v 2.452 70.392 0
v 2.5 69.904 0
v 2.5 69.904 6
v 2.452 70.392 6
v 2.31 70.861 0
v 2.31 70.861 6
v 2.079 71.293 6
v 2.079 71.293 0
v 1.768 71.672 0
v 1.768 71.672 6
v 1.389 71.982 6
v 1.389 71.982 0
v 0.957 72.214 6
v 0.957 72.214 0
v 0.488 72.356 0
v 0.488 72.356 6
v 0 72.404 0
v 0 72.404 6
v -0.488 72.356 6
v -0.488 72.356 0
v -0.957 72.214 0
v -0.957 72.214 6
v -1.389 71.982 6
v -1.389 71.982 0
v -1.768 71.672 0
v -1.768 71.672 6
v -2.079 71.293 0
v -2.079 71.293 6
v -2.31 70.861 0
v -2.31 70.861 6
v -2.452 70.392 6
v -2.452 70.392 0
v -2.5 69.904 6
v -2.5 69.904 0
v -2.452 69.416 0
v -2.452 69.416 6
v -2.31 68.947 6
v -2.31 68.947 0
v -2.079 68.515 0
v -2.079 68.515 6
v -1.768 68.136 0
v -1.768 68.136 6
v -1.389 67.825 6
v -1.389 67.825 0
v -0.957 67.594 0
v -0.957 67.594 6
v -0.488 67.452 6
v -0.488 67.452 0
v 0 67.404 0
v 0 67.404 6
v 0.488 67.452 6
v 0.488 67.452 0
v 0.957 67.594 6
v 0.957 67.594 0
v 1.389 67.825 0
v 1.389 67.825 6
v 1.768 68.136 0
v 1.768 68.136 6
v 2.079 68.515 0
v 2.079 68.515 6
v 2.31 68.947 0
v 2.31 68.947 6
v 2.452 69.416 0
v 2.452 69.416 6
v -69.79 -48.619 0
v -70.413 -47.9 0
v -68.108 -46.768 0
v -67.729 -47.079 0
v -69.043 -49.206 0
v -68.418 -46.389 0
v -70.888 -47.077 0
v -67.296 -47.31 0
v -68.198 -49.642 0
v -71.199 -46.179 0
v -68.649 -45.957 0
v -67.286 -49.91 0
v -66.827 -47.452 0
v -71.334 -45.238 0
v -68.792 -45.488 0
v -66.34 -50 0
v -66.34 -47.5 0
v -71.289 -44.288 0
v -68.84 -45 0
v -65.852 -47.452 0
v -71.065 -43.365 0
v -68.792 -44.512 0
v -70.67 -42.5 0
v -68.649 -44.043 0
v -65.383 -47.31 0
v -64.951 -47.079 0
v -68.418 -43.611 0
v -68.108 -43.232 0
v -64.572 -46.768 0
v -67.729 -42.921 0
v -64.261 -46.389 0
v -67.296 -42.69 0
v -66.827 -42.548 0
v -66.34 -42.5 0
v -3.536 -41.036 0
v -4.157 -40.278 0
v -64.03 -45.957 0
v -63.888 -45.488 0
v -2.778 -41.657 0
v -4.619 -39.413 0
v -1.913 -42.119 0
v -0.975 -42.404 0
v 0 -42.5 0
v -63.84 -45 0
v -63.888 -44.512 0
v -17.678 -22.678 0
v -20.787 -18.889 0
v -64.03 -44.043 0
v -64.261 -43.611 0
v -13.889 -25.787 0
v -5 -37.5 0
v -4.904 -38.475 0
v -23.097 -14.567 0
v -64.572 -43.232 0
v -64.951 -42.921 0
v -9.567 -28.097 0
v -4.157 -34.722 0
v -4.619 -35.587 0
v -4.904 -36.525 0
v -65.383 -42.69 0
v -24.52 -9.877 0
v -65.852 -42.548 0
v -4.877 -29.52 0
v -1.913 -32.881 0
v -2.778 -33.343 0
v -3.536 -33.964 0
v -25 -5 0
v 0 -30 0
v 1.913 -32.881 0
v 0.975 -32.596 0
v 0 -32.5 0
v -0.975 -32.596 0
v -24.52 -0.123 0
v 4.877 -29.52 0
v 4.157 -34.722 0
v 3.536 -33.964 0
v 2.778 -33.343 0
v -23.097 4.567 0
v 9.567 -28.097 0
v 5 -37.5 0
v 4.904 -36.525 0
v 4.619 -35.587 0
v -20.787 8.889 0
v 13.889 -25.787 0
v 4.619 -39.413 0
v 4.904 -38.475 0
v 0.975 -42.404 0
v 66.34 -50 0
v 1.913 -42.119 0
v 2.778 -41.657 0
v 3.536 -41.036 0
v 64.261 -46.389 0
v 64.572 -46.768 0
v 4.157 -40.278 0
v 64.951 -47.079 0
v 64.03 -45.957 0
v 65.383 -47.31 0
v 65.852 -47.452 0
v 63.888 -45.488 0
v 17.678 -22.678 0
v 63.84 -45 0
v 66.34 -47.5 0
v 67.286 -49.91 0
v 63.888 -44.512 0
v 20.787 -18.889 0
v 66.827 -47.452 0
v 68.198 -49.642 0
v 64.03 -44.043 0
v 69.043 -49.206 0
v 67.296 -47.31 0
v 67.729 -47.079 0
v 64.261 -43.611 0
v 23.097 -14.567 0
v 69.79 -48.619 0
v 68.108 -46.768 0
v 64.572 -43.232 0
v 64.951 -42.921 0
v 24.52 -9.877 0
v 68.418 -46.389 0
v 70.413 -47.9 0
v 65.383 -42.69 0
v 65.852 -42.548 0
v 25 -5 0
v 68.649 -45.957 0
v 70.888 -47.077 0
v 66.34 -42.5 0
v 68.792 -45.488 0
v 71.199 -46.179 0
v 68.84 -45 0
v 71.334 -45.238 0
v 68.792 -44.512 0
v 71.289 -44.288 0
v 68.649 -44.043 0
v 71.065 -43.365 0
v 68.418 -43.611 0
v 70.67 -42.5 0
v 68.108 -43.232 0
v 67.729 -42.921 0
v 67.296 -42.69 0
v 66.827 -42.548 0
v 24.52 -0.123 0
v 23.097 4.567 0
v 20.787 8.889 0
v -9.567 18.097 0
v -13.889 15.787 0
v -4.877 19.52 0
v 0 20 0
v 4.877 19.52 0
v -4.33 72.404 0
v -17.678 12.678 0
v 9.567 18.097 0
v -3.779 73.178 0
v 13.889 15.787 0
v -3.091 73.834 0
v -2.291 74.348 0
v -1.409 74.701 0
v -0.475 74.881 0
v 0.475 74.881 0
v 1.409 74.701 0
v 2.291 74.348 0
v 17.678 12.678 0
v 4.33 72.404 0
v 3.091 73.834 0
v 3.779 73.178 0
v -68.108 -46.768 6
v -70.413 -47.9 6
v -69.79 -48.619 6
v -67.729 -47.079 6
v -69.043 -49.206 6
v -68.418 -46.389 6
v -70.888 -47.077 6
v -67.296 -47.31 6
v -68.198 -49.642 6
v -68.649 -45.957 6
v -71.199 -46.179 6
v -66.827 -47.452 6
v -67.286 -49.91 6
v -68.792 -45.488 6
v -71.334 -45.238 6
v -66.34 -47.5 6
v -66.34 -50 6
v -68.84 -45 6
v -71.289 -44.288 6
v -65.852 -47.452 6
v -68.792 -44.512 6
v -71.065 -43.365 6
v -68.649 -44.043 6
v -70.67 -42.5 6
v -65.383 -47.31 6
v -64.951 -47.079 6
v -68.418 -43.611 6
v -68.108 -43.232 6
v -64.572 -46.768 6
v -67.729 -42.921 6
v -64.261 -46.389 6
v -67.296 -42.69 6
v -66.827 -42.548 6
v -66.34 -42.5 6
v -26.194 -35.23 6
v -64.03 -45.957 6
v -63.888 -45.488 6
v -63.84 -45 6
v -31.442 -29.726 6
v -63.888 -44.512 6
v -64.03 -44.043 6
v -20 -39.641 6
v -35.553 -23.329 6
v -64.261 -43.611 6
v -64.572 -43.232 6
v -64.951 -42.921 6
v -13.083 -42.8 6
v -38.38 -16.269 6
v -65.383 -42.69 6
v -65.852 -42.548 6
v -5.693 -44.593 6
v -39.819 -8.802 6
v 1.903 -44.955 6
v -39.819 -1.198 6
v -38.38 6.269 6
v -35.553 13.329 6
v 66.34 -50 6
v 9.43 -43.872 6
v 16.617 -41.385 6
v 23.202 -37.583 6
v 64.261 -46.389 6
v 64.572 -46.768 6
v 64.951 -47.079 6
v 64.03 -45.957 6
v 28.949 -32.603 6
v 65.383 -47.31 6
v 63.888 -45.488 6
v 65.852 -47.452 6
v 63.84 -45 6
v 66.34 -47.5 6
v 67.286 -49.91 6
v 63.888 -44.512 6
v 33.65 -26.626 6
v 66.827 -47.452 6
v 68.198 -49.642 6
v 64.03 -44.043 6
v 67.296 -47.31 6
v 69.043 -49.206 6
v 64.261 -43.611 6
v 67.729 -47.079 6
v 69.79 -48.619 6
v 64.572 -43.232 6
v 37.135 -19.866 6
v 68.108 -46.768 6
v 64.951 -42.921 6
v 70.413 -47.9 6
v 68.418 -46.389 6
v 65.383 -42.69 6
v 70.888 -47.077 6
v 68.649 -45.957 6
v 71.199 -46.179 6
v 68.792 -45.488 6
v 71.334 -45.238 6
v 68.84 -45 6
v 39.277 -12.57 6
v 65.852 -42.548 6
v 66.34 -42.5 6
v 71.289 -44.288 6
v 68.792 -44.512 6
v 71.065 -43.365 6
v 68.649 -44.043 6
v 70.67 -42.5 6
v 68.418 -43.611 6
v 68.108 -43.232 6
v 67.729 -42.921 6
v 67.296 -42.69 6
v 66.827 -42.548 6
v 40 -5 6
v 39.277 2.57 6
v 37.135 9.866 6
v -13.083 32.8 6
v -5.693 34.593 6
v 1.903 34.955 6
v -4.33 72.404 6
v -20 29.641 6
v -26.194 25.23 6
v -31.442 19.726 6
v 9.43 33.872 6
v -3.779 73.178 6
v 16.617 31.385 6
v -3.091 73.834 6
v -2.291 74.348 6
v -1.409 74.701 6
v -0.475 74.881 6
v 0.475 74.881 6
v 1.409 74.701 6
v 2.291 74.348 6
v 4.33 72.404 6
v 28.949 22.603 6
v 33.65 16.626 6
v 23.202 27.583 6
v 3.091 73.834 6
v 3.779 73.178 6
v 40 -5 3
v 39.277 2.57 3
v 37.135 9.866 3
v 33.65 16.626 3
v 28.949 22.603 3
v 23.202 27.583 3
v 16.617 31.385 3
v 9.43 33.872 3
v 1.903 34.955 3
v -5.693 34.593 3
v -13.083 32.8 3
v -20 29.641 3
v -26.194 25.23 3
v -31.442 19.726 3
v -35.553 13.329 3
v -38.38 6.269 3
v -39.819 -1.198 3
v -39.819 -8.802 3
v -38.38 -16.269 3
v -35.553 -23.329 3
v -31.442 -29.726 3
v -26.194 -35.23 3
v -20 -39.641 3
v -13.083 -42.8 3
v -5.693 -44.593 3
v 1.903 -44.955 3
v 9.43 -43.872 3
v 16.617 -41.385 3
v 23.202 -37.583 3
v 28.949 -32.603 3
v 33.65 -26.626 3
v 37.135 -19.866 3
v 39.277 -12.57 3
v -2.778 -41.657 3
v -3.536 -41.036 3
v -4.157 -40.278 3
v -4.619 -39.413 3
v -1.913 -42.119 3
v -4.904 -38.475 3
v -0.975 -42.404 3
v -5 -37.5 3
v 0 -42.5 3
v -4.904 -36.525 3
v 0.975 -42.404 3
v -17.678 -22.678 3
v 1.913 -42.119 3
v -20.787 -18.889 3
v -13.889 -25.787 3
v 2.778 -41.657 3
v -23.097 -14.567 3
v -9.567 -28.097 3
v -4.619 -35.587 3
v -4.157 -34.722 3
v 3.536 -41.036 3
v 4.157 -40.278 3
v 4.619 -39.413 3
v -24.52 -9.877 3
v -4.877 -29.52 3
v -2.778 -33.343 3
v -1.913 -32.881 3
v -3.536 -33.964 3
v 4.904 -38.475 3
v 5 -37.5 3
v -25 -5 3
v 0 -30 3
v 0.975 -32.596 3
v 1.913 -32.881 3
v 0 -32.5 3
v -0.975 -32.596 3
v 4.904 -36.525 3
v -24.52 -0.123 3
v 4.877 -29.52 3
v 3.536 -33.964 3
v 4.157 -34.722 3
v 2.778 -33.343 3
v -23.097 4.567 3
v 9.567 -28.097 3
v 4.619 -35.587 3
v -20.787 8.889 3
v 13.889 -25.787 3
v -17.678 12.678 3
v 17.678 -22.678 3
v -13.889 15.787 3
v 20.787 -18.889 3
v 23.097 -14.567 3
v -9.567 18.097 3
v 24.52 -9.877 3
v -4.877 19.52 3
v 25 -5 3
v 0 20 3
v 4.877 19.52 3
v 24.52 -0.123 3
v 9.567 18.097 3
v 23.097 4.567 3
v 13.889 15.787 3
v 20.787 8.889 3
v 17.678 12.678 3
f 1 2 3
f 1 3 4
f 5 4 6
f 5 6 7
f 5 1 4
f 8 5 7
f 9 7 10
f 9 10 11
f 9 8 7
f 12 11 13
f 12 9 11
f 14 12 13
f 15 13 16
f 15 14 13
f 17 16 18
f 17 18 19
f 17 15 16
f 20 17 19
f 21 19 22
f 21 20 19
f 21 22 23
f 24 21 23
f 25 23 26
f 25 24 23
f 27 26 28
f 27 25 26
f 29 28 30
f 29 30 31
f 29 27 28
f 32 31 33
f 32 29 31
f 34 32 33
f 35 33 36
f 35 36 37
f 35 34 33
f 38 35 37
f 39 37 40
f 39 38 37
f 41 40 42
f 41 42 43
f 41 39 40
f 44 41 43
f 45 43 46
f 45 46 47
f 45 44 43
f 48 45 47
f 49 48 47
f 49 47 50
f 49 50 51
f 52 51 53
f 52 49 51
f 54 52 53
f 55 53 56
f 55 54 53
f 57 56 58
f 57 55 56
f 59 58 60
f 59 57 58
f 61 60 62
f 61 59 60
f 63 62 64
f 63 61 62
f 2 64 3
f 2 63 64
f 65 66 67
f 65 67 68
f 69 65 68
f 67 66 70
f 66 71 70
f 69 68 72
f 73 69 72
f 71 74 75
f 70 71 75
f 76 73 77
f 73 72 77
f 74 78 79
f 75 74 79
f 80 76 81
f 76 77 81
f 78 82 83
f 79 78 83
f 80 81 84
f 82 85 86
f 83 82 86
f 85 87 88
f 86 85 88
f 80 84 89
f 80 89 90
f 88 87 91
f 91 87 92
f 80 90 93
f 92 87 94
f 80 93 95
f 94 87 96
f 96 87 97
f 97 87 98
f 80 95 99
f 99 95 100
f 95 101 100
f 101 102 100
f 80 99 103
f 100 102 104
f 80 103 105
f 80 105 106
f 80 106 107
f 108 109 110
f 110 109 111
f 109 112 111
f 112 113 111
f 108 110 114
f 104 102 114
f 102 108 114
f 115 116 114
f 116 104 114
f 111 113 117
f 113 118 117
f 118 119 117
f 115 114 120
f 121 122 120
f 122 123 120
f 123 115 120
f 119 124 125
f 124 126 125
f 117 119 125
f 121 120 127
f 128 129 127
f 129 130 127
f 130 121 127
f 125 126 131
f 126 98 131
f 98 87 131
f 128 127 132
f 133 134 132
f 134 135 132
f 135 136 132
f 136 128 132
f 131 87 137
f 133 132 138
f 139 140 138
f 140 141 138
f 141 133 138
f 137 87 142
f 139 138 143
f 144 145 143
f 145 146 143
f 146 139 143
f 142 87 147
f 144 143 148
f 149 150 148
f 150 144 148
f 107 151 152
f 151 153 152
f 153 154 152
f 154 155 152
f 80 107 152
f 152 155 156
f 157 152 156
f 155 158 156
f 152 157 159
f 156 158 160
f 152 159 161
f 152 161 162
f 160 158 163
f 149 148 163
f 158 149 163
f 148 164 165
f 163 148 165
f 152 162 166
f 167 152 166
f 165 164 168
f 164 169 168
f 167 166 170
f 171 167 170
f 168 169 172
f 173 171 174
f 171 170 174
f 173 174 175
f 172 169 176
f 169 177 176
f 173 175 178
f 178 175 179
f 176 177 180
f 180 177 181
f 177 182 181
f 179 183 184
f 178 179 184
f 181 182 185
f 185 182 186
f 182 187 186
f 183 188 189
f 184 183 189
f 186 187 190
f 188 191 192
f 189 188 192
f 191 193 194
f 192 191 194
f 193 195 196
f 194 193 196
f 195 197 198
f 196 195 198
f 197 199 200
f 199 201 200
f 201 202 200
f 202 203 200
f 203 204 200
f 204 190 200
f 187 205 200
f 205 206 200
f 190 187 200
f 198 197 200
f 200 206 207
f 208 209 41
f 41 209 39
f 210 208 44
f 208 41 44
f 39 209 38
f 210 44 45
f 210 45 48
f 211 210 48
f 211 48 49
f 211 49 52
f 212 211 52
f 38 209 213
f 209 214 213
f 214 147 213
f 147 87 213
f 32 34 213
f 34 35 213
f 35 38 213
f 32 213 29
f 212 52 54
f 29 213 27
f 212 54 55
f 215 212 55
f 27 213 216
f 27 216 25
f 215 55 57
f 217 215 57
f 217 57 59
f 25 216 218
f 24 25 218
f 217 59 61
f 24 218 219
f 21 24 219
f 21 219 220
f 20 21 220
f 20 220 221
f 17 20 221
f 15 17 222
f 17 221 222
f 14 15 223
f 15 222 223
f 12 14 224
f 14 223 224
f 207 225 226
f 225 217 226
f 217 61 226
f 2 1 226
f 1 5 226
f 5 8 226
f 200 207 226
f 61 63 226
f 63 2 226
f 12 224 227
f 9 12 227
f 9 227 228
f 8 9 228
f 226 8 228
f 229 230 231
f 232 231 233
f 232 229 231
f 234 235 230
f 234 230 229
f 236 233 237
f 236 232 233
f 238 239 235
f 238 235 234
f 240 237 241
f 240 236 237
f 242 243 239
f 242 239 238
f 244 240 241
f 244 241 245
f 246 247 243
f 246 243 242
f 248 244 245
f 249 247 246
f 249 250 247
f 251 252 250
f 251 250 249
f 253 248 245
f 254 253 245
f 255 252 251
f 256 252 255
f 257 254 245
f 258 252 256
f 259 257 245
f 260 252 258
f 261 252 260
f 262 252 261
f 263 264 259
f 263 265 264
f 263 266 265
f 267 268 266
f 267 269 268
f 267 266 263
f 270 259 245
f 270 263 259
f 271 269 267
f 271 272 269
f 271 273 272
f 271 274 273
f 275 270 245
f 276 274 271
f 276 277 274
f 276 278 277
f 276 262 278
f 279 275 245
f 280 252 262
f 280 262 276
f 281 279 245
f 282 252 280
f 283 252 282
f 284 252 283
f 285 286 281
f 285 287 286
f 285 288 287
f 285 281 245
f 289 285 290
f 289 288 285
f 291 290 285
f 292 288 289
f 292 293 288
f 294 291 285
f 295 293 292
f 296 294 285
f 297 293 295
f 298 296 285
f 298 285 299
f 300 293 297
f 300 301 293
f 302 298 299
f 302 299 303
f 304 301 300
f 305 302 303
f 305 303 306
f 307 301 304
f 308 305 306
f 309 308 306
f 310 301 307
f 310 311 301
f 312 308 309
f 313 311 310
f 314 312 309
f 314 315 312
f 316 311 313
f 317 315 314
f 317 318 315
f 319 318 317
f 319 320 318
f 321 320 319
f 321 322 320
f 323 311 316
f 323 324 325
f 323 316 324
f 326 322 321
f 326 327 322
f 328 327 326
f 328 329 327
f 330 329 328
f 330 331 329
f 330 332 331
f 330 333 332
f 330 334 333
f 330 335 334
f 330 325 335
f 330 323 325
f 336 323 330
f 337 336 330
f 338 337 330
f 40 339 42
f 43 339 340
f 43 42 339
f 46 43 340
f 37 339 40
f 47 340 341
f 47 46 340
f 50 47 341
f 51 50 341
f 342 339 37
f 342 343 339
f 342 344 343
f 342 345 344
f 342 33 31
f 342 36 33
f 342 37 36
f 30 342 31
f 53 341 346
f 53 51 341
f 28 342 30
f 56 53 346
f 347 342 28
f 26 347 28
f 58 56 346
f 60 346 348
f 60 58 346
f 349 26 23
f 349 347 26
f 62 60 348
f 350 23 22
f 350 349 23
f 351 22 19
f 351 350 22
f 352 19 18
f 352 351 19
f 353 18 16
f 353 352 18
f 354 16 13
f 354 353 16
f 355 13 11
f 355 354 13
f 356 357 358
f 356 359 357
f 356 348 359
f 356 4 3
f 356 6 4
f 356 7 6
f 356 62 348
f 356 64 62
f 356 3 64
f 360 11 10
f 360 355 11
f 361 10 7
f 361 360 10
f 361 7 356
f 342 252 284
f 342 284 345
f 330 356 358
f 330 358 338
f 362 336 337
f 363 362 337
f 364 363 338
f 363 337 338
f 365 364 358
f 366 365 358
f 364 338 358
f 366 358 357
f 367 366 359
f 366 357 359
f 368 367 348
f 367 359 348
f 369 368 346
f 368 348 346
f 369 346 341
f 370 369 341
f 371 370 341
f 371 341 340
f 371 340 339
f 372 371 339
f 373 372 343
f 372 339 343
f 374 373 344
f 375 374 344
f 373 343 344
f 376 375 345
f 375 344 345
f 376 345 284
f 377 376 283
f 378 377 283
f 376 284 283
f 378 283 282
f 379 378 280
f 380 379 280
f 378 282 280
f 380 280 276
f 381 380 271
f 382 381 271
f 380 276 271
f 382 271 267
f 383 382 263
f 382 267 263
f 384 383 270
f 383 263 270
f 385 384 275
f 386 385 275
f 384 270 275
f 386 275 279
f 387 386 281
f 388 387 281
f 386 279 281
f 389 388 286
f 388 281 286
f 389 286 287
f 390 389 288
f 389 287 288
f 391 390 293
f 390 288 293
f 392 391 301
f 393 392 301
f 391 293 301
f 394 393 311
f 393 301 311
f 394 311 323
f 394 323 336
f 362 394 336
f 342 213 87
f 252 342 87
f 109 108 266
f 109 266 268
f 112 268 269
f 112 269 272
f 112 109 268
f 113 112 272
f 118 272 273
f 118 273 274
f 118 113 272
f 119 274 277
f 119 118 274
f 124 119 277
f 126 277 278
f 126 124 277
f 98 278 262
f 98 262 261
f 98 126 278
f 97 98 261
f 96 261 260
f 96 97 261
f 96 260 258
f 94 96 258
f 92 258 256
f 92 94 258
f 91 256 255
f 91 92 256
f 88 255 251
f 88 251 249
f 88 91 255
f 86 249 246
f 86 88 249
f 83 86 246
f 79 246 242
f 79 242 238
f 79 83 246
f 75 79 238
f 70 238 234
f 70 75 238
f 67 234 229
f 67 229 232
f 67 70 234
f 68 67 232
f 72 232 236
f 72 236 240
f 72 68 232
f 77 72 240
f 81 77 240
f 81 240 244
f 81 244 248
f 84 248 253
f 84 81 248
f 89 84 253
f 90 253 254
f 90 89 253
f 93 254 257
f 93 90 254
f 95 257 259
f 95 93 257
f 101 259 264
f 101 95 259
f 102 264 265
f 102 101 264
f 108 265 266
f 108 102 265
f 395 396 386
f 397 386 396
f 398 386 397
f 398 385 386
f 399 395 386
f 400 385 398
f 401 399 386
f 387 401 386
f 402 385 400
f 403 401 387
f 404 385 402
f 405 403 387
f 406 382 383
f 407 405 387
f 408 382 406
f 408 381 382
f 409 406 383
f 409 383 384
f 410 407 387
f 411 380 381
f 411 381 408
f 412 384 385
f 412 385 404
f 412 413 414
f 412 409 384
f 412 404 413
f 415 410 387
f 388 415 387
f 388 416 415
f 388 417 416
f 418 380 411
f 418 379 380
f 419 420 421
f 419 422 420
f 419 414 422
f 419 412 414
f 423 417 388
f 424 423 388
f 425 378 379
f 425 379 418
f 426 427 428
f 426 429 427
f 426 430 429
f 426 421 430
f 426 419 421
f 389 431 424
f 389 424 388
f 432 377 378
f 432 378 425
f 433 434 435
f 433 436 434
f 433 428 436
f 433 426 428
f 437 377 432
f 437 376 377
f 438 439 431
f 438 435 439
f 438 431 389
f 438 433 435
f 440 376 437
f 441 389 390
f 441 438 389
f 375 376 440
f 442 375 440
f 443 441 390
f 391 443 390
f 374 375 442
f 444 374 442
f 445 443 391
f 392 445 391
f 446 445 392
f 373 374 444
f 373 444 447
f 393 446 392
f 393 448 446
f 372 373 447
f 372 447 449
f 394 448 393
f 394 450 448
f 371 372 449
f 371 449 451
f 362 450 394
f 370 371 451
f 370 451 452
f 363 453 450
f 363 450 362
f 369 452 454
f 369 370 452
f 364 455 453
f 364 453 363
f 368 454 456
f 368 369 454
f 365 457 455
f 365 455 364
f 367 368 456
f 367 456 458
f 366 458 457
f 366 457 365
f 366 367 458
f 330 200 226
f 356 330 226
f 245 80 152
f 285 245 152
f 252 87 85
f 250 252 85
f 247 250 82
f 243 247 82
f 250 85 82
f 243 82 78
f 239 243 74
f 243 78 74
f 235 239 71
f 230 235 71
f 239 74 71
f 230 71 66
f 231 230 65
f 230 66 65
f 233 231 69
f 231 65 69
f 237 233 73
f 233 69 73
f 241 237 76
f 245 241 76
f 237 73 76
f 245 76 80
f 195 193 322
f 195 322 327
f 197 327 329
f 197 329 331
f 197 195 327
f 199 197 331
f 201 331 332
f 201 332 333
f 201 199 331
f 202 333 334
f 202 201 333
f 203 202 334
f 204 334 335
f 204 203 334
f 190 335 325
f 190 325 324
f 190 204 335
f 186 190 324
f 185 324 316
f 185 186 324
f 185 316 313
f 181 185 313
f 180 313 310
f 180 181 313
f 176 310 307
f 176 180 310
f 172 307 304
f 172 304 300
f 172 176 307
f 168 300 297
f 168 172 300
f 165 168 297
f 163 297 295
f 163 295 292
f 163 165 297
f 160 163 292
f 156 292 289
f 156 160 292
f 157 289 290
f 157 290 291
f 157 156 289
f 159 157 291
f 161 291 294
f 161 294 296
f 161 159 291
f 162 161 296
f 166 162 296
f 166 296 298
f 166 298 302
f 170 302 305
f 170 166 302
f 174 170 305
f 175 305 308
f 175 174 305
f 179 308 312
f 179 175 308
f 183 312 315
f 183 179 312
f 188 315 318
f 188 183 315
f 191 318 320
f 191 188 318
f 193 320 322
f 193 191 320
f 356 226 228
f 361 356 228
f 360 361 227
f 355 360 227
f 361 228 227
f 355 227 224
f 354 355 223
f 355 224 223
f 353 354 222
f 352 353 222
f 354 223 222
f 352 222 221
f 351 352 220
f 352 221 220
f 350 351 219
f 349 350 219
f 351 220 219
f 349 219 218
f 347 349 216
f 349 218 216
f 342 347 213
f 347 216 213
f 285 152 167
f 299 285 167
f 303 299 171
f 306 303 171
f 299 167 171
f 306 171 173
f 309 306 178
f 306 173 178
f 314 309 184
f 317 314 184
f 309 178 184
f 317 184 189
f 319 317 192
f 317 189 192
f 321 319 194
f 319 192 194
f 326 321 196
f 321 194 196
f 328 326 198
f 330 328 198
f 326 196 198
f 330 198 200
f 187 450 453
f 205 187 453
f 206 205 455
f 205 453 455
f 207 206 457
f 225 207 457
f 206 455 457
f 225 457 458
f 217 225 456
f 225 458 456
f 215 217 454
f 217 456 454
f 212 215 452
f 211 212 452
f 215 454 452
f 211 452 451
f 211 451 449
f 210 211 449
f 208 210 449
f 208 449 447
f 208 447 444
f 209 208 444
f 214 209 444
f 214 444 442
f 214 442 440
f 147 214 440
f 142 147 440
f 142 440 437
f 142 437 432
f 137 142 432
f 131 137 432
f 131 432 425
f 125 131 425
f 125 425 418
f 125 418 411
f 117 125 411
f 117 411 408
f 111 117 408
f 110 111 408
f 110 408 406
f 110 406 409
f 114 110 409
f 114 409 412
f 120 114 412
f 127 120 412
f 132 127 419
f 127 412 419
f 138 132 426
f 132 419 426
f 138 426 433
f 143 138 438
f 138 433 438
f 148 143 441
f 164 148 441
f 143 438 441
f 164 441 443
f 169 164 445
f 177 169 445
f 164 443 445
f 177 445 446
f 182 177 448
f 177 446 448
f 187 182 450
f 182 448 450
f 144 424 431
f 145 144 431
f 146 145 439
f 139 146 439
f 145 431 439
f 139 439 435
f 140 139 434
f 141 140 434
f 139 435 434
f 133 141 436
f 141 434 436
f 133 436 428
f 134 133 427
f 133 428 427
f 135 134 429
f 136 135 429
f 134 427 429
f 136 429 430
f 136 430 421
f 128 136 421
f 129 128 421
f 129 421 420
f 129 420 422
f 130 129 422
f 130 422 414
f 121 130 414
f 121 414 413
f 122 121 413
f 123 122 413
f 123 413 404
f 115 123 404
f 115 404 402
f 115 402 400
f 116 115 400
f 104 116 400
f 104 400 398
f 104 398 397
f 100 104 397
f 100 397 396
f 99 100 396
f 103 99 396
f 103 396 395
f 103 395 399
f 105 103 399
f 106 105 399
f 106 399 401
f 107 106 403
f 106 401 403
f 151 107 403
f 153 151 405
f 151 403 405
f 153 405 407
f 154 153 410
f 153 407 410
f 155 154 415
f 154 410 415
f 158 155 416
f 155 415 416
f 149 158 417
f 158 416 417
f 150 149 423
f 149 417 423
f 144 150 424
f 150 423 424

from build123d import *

# Parameters (mm, degrees)
F0_R     = 2.5
F1_DEPTH = 6
F2_R     = 40
F3_DEPTH = 3
F4_R     = 25
F5_DEPTH = 25
F6_R     = 5
F7_DEPTH = 25


with BuildPart() as f1:
    # F0 (on Top) → F1 (new body)
    with BuildSketch(Plane.XY):
        with BuildLine():
            ThreePointArc((4.330127, 72.403811), (0, 74.903811), (-4.330127, 72.403811))
            Line((-4.330127, 72.403811), (-70.669873, -42.5))
            ThreePointArc((-70.669873, -42.5), (-70.669873, -47.5), (-66.339746, -50))
            Line((-66.339746, -50), (66.339746, -50))
            ThreePointArc((66.339746, -50), (70.669873, -47.5), (70.669873, -42.5))
            Line((70.669873, -42.5), (4.330127, 72.403811))
        make_face()
        with Locations((-66.339746, -45)):
            Circle(F0_R, mode=Mode.SUBTRACT)
        with Locations((66.339746, -45)):
            Circle(F0_R, mode=Mode.SUBTRACT)
        with Locations((0, 69.903811)):
            Circle(F0_R, mode=Mode.SUBTRACT)
    extrude(amount=F1_DEPTH)

    # F2 (on face) → F3 (cut)
    with BuildSketch(Plane.XY.offset(6)):
        with Locations((0, -5)):
            Circle(F2_R)
    extrude(amount=-F3_DEPTH, mode=Mode.SUBTRACT)

    # F4 (on face) → F5 (cut)
    with BuildSketch(Plane.XY.offset(3)):
        with Locations((0, -5)):
            Circle(F4_R)
    extrude(amount=-F5_DEPTH, mode=Mode.SUBTRACT)

    # F6 (on face) → F7 (cut)
    with BuildSketch(Plane.XY.offset(3)):
        with Locations((0, -37.5)):
            Circle(F6_R)
    extrude(amount=-F7_DEPTH, mode=Mode.SUBTRACT)


solid = f1.part
